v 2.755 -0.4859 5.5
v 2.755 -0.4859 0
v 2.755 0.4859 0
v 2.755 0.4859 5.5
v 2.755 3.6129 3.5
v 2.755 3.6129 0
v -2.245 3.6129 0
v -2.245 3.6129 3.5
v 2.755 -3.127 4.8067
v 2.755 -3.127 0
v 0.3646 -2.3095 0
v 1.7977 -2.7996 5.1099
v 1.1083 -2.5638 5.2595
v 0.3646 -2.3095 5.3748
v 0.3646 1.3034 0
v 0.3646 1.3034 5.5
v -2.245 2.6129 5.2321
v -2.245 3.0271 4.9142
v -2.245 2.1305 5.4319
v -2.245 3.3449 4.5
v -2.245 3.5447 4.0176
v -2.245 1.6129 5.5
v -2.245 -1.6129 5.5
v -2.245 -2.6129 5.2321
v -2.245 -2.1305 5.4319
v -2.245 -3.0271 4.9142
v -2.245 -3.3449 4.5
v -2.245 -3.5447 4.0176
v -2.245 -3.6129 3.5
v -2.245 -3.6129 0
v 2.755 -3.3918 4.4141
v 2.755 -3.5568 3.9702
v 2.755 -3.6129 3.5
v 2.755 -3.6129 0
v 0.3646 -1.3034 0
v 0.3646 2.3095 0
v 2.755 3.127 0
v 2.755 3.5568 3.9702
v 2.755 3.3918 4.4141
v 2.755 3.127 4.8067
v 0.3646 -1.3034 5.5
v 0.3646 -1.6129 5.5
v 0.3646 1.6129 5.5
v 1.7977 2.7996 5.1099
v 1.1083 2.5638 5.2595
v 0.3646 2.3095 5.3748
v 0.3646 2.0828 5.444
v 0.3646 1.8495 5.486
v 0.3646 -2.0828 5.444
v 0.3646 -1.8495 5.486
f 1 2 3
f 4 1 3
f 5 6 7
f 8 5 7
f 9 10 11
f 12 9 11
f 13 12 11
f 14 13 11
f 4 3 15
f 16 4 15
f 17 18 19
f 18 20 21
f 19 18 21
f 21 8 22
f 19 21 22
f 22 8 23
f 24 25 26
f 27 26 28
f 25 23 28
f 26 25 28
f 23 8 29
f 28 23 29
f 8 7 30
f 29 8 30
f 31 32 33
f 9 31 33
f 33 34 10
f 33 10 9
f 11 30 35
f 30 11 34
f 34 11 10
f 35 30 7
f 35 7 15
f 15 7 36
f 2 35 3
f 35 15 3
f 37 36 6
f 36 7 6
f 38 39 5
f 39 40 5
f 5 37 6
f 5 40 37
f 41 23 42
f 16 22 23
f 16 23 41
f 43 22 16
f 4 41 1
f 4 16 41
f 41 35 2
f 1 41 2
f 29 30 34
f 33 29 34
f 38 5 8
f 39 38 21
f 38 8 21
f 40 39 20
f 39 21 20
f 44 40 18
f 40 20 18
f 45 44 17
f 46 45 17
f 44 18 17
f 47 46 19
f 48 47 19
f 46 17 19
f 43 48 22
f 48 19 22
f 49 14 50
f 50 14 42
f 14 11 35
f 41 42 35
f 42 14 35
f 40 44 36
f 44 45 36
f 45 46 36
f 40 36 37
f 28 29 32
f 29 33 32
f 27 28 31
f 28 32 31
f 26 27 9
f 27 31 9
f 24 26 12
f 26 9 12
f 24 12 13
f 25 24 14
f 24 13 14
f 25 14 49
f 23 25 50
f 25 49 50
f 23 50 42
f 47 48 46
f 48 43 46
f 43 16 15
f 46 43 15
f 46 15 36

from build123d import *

# Parameters (mm, degrees)
BOSS_EXTRUDE1_DEPTH = 5.5
FILLET1_R           = 2


with BuildPart() as part:
    # Sketch1 → Boss-Extrude1 (new body)
    with BuildSketch(Plane.XY):
        Polygon((2.754977626, -3.612882911), (2.754977626, -3.127020625), (0.364622857, -2.309471144), (0.364622857, -1.303411767), (2.754977626, -0.485862286), (2.754977626, 0.485862286), (0.364622857, 1.303411767), (0.364622857, 2.309471144), (2.754977626, 3.127020625), (2.754977626, 3.612882911), (-2.245021882, 3.612882911), (-2.245021014, -3.612882911), align=None)
    extrude(amount=BOSS_EXTRUDE1_DEPTH)

    # Fillet1
    fillet1_edges = [part.edges().sort_by_distance(p)[0] for p in [
        (0.254978306, -3.612882911, 5.5),
        (0.254977872, 3.612882911, 5.5),
    ]]
    fillet(fillet1_edges, radius=FILLET1_R)


solid = part.part
